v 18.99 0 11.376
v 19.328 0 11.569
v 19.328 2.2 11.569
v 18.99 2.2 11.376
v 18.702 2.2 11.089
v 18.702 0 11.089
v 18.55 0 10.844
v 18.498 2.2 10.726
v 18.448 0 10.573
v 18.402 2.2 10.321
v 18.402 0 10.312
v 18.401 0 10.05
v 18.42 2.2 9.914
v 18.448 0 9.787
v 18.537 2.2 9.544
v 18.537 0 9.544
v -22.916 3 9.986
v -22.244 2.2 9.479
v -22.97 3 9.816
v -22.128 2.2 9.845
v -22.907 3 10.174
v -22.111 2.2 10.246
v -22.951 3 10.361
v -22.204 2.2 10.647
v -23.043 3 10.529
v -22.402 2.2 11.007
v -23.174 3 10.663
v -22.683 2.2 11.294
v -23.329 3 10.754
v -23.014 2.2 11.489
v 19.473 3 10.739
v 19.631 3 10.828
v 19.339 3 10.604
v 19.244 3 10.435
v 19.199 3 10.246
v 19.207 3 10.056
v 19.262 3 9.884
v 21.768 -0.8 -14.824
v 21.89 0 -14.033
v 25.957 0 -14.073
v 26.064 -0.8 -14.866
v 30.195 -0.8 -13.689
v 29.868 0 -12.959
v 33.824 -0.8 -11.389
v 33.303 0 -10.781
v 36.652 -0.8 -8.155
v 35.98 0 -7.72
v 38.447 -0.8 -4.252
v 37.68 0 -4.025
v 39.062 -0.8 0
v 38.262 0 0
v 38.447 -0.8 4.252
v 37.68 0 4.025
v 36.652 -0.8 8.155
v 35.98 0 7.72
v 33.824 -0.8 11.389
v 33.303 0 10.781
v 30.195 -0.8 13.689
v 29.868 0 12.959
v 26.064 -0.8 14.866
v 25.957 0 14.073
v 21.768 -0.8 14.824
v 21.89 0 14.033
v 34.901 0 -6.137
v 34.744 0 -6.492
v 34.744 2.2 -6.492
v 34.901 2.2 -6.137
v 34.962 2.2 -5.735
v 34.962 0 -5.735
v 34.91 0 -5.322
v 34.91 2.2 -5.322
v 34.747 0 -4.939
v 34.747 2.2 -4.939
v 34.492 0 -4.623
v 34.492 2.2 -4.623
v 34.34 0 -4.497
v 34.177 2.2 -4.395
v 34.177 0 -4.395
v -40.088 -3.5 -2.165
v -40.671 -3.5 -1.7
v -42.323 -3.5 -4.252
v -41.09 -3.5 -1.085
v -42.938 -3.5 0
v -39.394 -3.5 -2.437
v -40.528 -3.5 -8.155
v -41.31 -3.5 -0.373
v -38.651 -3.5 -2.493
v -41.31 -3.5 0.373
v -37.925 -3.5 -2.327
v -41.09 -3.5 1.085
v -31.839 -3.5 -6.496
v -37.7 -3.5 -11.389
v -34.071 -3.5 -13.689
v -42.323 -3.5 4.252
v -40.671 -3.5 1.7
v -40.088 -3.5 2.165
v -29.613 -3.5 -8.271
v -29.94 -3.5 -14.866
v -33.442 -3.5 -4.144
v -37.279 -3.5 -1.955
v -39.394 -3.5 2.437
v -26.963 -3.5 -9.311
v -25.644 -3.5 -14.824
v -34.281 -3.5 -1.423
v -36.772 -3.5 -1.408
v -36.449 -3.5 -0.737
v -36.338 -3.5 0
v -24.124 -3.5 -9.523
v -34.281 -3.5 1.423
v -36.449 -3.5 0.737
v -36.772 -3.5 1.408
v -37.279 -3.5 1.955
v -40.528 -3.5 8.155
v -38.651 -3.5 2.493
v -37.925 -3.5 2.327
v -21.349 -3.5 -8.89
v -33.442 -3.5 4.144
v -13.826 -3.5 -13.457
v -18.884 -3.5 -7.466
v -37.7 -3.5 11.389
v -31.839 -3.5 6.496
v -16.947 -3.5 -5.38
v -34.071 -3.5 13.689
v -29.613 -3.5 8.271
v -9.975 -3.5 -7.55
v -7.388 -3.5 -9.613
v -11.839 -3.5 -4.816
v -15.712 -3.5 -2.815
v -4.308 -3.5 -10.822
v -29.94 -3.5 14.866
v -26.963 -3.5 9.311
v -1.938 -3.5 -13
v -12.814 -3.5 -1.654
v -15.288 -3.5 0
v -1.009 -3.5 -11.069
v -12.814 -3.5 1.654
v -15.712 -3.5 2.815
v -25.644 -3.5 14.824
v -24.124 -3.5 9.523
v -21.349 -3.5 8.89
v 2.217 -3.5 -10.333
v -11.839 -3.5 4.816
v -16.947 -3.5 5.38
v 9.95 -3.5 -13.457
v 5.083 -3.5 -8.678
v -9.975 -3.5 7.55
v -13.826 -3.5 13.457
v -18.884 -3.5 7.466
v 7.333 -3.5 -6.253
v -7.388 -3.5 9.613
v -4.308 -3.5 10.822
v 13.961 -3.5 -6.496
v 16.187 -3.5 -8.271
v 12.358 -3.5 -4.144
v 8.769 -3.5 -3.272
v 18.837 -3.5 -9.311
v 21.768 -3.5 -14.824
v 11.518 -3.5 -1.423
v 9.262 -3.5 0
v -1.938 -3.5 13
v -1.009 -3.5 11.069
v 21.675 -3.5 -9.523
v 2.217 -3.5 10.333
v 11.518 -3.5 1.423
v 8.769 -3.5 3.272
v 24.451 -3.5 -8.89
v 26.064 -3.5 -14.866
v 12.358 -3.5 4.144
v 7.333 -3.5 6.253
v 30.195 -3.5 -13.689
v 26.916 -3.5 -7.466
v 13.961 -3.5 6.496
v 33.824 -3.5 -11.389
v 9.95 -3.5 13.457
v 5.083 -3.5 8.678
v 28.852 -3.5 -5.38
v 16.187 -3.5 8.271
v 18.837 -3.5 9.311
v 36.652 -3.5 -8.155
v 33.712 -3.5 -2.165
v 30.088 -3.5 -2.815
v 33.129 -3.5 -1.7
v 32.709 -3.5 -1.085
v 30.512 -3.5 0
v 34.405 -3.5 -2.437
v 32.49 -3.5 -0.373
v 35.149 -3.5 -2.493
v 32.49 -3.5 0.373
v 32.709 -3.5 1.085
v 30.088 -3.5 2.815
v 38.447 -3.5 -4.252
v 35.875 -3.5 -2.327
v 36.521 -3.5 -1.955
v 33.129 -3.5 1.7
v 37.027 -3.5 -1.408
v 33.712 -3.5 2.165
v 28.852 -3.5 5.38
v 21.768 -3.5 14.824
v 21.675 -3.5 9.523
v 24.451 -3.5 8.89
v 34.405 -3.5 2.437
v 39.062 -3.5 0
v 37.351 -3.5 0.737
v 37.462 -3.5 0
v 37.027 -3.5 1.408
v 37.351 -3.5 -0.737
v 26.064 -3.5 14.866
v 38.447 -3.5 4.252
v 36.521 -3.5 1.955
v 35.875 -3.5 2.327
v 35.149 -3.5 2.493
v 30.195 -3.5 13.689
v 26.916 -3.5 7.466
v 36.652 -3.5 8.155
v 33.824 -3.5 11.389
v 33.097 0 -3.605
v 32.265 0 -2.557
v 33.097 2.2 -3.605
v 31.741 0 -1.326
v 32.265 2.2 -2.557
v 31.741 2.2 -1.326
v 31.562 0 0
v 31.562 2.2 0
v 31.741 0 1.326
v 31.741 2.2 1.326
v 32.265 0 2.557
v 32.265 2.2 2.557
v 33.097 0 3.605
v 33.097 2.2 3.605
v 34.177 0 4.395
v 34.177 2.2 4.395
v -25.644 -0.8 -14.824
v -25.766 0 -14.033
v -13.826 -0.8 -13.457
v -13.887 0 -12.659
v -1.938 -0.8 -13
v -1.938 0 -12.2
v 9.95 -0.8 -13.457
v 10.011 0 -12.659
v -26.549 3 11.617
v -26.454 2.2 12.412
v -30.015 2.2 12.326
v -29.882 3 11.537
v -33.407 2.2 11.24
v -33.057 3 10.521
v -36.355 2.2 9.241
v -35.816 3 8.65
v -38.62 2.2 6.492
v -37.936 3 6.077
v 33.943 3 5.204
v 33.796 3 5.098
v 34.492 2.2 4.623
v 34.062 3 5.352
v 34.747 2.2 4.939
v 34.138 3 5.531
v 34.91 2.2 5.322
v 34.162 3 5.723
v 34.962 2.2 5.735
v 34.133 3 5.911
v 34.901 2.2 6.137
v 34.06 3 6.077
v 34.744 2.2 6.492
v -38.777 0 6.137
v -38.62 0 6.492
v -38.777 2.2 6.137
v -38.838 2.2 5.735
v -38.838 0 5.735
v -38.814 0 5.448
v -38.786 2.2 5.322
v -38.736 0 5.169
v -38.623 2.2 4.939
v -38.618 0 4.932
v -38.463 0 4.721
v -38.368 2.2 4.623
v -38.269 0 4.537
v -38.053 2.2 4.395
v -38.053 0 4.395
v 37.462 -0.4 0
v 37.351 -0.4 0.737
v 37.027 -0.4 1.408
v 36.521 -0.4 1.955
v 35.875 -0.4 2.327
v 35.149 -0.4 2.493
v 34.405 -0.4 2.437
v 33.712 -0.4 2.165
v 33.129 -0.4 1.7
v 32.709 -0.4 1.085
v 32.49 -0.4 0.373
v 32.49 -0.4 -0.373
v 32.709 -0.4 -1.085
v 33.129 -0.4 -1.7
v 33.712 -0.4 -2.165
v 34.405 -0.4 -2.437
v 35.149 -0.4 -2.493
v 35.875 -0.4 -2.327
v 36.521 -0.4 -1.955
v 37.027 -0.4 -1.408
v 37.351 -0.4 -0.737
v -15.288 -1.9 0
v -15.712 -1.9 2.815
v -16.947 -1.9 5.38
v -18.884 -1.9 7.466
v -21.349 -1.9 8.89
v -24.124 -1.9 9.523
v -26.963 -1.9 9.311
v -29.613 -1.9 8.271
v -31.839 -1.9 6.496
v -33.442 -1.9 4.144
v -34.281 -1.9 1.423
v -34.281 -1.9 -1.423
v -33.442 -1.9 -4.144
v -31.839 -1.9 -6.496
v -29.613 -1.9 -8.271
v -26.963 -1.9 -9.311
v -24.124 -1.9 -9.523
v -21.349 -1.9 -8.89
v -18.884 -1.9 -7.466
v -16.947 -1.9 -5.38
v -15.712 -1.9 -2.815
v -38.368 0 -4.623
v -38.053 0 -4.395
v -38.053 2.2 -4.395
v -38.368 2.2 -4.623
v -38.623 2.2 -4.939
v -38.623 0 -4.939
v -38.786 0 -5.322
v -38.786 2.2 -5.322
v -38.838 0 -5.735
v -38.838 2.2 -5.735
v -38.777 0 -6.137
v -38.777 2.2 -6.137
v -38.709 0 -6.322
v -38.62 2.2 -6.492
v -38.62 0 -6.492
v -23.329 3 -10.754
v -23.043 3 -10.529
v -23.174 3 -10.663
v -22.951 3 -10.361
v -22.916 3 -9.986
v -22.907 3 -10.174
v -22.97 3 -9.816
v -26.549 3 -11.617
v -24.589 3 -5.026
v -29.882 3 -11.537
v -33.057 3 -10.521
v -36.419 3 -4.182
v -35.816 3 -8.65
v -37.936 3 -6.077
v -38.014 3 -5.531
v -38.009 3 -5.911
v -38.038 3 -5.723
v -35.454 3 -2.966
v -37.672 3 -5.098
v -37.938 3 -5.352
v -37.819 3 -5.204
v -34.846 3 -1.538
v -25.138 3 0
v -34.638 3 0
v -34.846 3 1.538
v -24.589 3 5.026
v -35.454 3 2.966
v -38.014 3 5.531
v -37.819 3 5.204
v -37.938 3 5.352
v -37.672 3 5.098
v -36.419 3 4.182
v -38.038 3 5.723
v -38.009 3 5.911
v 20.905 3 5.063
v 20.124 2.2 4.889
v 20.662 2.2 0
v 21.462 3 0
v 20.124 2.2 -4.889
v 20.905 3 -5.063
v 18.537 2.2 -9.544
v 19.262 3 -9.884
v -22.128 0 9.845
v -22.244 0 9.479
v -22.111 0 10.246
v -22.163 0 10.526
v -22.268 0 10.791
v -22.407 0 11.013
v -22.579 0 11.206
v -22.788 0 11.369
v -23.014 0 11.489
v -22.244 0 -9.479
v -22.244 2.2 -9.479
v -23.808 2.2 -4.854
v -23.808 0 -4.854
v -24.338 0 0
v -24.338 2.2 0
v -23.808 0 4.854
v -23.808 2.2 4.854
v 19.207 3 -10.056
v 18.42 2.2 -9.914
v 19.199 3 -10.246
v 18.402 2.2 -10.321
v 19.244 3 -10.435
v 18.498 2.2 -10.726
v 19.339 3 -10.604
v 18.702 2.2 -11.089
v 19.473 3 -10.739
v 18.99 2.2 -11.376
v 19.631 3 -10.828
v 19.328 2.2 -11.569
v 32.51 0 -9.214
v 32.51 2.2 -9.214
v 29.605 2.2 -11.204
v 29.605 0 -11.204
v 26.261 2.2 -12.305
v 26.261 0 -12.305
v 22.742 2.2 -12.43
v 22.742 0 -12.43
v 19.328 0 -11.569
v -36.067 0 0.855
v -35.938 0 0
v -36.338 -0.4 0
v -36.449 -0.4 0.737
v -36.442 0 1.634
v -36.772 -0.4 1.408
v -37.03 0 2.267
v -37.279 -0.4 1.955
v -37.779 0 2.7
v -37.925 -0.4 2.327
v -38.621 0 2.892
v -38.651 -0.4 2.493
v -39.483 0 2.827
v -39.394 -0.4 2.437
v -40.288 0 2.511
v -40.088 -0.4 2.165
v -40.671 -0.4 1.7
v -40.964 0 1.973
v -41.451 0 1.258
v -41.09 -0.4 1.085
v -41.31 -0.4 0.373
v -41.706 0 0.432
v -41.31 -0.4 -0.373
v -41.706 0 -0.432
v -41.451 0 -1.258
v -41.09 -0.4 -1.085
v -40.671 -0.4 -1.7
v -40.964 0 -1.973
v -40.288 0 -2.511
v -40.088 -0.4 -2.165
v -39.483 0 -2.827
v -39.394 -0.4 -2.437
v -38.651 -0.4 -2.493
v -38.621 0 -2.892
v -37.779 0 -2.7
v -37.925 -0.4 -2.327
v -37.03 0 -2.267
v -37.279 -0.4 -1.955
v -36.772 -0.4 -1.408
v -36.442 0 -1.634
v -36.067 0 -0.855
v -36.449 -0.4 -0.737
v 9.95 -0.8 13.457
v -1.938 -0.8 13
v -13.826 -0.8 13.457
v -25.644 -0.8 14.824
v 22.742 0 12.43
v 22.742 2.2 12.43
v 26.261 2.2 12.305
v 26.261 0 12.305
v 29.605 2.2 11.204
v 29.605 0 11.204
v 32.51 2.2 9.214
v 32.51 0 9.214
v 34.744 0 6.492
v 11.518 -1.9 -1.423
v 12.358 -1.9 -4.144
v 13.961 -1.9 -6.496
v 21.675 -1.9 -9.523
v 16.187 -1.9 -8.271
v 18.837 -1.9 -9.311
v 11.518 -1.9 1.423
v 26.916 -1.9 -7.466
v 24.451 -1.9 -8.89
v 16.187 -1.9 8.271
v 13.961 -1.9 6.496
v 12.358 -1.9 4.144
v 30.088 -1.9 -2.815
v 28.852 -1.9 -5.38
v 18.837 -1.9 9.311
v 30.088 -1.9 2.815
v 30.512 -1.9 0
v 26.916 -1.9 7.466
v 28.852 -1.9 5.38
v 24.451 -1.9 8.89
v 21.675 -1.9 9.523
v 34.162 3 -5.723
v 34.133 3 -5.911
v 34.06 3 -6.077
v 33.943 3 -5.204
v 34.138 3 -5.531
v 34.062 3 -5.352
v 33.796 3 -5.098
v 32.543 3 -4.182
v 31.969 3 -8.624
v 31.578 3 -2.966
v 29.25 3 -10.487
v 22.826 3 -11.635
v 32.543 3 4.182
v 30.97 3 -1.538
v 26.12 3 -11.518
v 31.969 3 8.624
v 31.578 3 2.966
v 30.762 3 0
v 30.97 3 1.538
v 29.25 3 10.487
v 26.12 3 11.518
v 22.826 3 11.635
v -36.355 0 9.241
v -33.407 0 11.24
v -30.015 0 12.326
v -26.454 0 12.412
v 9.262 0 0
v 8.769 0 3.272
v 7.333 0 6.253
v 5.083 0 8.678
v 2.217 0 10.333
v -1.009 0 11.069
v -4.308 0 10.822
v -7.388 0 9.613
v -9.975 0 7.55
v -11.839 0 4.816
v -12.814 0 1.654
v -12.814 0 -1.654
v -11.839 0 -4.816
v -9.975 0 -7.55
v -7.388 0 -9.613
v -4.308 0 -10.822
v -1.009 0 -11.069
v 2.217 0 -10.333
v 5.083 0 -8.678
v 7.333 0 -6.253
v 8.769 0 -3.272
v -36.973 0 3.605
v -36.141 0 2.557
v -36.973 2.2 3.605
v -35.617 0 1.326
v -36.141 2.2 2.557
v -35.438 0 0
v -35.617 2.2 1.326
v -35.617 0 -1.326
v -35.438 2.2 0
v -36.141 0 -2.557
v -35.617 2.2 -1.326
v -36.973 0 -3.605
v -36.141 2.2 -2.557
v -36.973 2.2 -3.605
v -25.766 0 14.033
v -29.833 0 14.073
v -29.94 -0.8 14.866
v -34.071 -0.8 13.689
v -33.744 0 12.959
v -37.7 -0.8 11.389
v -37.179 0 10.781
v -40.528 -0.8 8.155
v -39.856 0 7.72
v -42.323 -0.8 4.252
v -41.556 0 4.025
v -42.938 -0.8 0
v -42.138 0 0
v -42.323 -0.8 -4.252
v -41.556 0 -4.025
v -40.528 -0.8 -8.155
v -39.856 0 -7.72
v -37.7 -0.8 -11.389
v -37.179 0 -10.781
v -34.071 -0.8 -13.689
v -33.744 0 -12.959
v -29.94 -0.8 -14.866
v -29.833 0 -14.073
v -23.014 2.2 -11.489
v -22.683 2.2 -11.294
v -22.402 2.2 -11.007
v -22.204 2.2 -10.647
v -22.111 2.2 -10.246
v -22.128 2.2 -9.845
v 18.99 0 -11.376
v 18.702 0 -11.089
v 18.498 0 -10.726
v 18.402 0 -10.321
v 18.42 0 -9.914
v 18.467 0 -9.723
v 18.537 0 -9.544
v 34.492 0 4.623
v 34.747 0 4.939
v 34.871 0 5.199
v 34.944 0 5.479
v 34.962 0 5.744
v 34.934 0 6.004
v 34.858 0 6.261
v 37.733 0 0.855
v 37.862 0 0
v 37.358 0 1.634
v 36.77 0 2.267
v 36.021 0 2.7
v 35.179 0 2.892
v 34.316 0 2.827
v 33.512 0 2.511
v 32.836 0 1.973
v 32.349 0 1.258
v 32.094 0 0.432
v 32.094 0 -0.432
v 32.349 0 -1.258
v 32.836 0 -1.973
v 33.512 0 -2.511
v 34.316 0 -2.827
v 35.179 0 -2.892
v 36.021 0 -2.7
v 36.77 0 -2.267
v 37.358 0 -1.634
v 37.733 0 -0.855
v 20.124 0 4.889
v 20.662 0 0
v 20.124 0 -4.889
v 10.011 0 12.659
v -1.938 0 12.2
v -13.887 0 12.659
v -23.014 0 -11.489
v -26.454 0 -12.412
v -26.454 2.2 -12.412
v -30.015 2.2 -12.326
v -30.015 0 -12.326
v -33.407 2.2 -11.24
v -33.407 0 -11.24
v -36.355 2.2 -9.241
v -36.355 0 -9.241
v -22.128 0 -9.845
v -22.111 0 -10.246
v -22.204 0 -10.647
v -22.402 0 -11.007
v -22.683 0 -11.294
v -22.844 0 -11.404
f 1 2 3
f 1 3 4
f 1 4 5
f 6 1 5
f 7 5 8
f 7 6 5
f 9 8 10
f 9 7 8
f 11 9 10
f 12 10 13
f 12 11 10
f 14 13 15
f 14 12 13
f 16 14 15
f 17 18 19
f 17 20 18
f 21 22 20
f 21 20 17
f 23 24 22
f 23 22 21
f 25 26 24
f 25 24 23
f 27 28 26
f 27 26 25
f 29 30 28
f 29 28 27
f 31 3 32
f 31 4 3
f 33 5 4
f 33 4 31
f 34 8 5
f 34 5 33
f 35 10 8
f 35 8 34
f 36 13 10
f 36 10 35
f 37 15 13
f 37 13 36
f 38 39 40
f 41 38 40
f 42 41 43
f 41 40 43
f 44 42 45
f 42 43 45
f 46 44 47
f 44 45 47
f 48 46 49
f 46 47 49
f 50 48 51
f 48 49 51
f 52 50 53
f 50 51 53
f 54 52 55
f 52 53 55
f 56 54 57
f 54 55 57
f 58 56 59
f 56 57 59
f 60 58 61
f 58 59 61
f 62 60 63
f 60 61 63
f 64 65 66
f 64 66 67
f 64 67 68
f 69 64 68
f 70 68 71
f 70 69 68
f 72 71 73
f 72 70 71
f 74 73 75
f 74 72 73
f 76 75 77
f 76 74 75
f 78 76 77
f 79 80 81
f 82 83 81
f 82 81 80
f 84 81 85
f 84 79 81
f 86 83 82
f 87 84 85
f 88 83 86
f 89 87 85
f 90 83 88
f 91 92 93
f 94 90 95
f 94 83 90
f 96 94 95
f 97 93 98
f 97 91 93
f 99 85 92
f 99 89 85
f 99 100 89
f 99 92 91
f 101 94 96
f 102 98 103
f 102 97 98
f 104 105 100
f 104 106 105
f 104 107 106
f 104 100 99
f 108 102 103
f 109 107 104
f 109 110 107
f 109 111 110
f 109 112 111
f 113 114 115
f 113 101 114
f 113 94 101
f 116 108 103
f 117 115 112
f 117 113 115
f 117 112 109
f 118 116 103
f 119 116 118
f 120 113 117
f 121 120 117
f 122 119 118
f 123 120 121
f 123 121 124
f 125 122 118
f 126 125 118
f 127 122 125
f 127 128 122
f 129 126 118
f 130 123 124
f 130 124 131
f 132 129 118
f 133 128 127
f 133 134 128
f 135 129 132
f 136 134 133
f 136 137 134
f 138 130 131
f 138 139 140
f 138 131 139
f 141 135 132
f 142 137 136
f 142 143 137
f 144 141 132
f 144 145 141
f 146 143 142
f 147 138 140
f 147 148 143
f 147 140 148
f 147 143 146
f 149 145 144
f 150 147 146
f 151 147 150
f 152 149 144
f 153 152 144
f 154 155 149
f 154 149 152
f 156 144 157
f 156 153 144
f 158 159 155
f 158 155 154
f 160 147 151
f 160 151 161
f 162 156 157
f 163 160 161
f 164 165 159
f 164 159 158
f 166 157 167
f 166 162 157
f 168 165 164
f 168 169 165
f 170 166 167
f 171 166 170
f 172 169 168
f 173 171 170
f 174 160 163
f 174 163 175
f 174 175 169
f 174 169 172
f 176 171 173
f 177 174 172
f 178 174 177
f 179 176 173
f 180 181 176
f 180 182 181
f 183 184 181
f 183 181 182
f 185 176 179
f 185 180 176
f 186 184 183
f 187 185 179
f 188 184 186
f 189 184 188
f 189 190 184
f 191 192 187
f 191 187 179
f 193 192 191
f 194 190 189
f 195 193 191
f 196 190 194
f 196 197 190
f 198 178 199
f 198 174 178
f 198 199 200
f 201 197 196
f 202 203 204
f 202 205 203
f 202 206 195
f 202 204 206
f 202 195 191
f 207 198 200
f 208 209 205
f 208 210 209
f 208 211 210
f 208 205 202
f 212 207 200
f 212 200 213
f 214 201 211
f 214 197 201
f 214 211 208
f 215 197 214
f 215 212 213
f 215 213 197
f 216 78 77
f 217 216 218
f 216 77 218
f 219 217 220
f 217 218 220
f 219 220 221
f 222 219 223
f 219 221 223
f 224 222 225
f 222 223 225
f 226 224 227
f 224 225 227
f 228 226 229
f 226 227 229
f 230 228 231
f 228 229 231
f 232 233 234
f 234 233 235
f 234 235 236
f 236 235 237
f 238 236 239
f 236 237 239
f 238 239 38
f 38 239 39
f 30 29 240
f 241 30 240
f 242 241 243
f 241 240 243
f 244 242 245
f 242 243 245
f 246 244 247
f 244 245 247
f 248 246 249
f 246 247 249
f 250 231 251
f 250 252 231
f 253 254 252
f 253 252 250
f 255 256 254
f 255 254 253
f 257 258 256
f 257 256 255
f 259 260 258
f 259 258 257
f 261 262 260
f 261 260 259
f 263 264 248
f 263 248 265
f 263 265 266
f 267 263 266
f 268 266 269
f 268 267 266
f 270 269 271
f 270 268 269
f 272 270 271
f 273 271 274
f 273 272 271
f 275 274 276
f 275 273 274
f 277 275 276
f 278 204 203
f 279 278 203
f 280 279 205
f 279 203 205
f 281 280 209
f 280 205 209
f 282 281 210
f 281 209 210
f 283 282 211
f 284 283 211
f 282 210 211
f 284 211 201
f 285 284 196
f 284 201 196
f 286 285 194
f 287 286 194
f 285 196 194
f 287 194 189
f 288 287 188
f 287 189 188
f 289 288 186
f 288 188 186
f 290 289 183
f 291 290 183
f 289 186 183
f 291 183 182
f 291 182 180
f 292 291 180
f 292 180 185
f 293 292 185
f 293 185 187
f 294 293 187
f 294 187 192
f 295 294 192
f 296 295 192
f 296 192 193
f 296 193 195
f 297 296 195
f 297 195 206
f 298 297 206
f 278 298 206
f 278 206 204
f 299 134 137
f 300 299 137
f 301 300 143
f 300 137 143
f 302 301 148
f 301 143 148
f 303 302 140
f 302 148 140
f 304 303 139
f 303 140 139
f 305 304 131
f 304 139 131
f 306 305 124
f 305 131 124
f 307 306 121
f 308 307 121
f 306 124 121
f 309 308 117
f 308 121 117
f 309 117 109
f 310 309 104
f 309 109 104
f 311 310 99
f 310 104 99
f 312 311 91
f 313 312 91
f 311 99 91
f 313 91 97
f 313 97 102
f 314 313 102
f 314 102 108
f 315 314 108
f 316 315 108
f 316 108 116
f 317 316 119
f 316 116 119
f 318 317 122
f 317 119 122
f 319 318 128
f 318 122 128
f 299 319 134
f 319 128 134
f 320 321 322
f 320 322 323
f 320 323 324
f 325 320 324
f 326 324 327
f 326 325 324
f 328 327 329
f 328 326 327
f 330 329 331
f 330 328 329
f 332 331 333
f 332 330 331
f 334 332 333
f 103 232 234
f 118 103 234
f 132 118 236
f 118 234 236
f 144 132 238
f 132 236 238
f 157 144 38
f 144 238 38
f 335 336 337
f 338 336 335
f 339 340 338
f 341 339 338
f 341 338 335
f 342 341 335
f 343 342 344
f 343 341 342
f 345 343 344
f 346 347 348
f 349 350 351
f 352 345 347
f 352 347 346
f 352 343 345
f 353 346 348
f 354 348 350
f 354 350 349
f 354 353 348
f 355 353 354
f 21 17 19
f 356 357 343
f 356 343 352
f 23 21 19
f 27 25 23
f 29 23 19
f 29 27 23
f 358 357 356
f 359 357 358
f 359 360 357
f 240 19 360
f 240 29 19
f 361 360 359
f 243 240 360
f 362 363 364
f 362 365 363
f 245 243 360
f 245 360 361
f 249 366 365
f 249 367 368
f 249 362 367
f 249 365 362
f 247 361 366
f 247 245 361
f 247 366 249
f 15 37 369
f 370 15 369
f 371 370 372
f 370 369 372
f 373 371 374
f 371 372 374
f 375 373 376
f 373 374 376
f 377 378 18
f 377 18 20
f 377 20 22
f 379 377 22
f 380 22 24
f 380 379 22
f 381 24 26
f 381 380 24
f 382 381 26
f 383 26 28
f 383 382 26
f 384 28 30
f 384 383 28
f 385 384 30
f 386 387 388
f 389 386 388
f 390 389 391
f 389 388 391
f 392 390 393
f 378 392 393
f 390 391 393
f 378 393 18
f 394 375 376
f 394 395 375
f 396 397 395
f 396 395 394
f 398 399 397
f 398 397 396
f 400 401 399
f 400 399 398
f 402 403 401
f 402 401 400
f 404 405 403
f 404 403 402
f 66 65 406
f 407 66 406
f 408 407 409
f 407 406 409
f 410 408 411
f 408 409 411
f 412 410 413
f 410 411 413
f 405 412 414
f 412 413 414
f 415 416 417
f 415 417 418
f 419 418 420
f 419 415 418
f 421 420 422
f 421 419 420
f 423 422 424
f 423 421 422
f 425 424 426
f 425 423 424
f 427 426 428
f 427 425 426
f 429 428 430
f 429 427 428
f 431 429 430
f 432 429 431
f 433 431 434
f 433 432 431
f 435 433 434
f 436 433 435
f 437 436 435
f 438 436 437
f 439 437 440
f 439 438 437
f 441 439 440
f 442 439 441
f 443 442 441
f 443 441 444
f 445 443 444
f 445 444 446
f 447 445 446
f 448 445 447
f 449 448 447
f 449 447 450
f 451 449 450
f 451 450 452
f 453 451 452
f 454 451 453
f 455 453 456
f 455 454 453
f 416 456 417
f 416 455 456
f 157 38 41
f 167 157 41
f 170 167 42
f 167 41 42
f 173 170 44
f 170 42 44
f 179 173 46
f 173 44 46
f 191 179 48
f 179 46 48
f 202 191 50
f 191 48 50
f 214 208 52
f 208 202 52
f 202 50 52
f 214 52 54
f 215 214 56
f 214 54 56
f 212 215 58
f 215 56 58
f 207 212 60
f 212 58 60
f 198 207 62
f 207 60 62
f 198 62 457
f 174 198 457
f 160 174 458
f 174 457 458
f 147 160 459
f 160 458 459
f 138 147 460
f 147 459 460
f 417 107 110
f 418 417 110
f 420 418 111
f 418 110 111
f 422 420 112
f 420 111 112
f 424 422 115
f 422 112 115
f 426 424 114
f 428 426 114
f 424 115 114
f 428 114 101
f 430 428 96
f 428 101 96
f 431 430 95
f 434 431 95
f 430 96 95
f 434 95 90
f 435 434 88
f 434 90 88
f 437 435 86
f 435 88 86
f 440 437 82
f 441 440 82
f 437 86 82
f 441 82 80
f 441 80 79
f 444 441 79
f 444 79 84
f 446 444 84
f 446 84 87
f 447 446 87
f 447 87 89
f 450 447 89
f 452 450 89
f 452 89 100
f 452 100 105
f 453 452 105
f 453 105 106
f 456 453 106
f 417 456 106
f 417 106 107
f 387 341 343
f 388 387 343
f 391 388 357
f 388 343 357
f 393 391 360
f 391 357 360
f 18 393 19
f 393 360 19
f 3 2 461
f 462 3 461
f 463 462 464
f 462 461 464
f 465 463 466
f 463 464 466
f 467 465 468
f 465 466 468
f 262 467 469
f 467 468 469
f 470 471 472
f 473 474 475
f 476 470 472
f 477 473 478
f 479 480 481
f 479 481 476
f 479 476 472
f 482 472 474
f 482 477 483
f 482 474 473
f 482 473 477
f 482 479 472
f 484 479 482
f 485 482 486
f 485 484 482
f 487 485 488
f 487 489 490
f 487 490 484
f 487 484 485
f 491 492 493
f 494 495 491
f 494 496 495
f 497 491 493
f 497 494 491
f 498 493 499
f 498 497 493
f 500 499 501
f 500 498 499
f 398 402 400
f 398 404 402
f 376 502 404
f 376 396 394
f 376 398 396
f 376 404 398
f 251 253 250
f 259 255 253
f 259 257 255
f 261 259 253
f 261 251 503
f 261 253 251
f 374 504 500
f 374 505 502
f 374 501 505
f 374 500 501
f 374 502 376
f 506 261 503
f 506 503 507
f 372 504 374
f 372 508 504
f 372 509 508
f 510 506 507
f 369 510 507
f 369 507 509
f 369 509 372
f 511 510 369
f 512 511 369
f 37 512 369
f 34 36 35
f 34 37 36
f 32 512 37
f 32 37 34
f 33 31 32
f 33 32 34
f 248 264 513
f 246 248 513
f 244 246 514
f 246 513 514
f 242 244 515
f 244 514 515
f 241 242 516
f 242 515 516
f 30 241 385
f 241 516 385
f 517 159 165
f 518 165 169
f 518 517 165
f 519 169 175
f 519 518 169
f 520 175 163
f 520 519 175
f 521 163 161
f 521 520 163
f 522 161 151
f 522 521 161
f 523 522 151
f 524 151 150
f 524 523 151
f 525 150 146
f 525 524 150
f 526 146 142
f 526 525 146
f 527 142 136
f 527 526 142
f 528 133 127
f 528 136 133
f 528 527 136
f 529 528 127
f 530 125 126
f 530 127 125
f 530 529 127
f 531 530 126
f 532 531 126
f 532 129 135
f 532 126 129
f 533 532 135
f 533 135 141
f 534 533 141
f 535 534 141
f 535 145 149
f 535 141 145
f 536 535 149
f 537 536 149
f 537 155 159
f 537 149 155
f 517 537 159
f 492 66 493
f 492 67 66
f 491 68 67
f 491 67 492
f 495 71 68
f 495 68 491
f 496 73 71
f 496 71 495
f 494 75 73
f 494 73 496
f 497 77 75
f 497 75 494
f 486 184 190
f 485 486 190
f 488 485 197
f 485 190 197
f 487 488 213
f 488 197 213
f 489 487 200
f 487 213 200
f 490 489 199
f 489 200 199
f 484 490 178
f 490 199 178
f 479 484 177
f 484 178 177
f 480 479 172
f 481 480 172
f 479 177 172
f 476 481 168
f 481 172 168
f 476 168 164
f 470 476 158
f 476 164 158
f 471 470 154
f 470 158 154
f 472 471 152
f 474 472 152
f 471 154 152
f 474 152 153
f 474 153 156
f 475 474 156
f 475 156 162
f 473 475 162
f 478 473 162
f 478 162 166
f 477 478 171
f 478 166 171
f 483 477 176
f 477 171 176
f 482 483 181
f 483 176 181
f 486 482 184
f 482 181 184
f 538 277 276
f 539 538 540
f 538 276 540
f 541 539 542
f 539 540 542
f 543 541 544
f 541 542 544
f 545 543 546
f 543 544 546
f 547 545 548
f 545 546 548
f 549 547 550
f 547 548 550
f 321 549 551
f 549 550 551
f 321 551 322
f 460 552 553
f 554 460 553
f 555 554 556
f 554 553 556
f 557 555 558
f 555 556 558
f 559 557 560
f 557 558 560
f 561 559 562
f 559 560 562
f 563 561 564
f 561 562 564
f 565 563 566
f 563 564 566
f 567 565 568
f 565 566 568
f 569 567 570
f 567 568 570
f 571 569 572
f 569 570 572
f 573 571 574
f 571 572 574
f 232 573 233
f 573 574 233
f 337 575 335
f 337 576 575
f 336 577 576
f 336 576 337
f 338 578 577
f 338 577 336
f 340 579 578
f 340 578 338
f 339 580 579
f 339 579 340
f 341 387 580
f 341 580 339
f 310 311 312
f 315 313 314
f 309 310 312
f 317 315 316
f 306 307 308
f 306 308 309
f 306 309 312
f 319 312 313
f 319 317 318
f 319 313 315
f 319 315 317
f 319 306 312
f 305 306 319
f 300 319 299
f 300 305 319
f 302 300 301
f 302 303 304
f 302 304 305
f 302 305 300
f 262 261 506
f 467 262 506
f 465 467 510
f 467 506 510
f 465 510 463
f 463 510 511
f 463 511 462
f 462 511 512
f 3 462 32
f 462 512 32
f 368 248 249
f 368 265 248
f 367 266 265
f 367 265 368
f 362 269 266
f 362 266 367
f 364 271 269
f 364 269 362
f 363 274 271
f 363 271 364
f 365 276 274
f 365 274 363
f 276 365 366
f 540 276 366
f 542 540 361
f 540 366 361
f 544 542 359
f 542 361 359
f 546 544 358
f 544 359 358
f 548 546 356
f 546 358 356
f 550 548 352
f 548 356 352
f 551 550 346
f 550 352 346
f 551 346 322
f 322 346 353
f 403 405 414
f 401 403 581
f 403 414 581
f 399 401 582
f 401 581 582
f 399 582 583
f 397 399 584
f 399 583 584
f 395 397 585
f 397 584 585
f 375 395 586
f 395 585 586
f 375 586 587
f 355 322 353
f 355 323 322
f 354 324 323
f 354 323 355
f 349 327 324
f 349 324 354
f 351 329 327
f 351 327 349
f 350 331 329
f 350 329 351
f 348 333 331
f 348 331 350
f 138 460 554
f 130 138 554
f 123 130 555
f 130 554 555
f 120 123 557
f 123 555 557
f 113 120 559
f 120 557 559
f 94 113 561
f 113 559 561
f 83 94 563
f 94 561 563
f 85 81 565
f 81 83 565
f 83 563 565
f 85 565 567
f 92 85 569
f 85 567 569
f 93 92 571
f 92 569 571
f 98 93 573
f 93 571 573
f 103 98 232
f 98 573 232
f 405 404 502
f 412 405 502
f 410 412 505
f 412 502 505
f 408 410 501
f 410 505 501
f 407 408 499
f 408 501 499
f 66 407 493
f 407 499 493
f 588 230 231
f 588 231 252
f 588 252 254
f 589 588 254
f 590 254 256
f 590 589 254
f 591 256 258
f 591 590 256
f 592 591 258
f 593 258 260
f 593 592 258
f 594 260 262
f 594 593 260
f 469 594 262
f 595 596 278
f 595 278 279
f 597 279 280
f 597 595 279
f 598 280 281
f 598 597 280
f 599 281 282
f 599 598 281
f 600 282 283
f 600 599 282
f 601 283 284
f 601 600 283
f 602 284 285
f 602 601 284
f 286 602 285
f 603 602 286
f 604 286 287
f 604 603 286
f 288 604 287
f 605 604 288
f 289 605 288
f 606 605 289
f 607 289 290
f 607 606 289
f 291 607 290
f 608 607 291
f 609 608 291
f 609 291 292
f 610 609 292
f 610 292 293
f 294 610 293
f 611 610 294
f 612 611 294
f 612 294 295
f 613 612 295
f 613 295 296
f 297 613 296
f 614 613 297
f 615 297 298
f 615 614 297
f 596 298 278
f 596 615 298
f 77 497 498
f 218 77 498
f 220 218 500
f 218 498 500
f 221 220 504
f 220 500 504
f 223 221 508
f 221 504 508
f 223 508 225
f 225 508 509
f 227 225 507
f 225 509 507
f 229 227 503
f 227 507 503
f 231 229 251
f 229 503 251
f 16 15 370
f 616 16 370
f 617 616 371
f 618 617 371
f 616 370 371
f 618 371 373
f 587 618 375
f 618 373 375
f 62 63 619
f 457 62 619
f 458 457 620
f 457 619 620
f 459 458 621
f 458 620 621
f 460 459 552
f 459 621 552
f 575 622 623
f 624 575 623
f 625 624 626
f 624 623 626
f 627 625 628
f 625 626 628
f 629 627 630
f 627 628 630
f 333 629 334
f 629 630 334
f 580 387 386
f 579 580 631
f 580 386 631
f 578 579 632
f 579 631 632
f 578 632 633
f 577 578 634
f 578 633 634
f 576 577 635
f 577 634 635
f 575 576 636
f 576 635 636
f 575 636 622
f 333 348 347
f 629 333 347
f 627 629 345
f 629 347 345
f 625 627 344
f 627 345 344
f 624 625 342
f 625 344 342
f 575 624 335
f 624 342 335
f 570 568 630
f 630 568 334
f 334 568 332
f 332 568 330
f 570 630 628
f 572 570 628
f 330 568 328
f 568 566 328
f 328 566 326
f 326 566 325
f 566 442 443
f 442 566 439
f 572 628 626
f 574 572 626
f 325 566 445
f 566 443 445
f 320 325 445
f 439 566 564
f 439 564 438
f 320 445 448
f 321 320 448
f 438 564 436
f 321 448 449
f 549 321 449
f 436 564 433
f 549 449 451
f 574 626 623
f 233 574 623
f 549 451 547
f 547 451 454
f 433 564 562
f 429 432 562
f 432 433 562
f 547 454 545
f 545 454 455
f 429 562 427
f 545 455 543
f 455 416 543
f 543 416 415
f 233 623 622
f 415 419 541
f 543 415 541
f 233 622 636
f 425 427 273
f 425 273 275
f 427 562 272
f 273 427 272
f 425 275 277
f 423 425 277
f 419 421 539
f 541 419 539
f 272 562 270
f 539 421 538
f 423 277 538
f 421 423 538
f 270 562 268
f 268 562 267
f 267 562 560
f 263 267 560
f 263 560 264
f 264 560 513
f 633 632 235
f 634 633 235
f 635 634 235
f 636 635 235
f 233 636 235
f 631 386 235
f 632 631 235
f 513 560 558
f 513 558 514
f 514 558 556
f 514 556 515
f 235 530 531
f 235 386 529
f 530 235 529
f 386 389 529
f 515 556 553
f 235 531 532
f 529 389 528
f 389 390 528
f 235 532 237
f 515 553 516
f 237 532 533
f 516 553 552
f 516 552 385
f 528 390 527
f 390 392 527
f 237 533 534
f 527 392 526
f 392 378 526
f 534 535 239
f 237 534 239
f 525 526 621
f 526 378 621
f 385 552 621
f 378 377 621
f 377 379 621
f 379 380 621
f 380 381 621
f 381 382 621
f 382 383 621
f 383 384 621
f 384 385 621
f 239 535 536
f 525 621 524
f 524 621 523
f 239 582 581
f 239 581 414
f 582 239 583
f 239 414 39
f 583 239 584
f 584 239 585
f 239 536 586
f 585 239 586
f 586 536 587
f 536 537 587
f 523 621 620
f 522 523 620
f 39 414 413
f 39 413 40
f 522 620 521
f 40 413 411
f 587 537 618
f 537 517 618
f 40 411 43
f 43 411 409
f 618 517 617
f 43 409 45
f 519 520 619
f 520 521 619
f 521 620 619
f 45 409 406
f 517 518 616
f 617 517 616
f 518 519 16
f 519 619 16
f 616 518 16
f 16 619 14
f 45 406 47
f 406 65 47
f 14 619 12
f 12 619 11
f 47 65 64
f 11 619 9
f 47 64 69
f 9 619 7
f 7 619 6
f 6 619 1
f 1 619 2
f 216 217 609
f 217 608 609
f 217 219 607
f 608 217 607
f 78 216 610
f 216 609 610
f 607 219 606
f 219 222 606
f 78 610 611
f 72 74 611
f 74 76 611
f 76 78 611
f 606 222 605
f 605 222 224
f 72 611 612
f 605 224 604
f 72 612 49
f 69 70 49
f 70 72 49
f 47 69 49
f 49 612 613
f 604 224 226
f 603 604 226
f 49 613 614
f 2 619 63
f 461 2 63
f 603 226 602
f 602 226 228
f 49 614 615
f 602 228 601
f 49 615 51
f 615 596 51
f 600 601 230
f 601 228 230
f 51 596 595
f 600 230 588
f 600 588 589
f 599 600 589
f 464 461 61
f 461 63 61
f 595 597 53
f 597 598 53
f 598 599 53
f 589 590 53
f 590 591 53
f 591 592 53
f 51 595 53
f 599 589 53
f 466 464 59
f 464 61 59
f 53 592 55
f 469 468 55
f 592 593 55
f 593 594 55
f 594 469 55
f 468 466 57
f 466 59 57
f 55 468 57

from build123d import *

# Parameters (mm, degrees)
F0_R      = 11.1
F1_DEPTH  = 7
F2_SIZE   = 0.8
F3_R      = 12.5
F4_DEPTH  = 3
F5_R      = 12.5
F6_DEPTH  = 3
F8_R      = 22.5
F9_DEPTH  = 3
F10_R     = 22.5
F11_DEPTH = 3
F12_R     = 5
F13_DEPTH = 3
F14_R     = 5
F15_DEPTH = 3
F16_R     = 5
F17_DEPTH = 3
F18_R     = 5
F19_DEPTH = 3
F20_R     = 1.5
F21_R     = 2.5
F22_DEPTH = 25
F23_R     = 2.5
F24_DEPTH = 25
F25_SIZE  = 0.4
F26_SIZE  = 0.8
F27_W     = 103.2572649419
F27_H     = 49.3412911892
F28_DEPTH = 6.5
F29_R     = 9.55
F30_DEPTH = 1.6


with BuildPart() as f1:
    # F0 (on Front) → F1 (new body)
    with BuildSketch(Plane.XZ):
        with BuildLine():
            ThreePointArc((21.7678643686, 14.8235294118), (-1.9380179843, 13), (-25.6439003372, 14.8235294118))
            ThreePointArc((-25.6439003372, 14.8235294118), (-42.9380179843, 0), (-25.6439003372, -14.8235294118))
            ThreePointArc((-25.6439003372, -14.8235294118), (-1.9380179843, -13), (21.7678643686, -14.8235294118))
            ThreePointArc((21.7678643686, -14.8235294118), (39.0619820157, 0), (21.7678643686, 14.8235294118))
        make_face()
        with Locations((-1.8380179843, 0)):
            Circle(F0_R, mode=Mode.SUBTRACT)
    extrude(amount=F1_DEPTH)

    # F2
    f2_edges = [f1.edges().sort_by_distance(p)[0] for p in [
        (-42.938018, -7, 0),
        (-1.938018, -7, -13),
        (-1.938018, 0, -13),
    ]]
    chamfer(f2_edges, length=F2_SIZE)

    # F3 (on face) → F4 (join)
    with BuildSketch(Plane.XZ.offset(7)):
        with Locations((-27.9380179843, 0)):
            Circle(F3_R)
        with Locations((24.0619820157, 0)):
            Circle(F3_R)
    extrude(amount=F4_DEPTH)

    # F5 (on face) → F6 (join)
    with BuildSketch(Plane(origin=(0, 0, 0), x_dir=(-1, 0, 0), z_dir=(0, 1, 0))):
        with Locations((-24.0619820157, 0)):
            Circle(F5_R)
        with Locations((27.9380179843, 0)):
            Circle(F5_R)
    extrude(amount=F6_DEPTH)

    # F8 (on face) → F9 (cut)
    with BuildSketch(Plane.XZ.offset(10)):
        with Locations((-1.8380179843, 0)):
            Circle(F8_R)
    extrude(amount=-F9_DEPTH, mode=Mode.SUBTRACT)

    # F10 (on face) → F11 (cut)
    with BuildSketch(Plane(origin=(0, 3, 0), x_dir=(-1, 0, 0), z_dir=(0, 1, 0))):
        with Locations((1.8380179843, 0)):
            Circle(F10_R)
    extrude(amount=-F11_DEPTH, mode=Mode.SUBTRACT)

    # F12 (on face) → F13 (cut)
    with BuildSketch(Plane(origin=(0, 3, 0), x_dir=(-1, 0, 0), z_dir=(0, 1, 0))):
        with Locations((-36.5619820157, 0)):
            Circle(F12_R)
    extrude(amount=-F13_DEPTH, mode=Mode.SUBTRACT)

    # F14 (on face) → F15 (cut)
    with BuildSketch(Plane(origin=(0, 3, 0), x_dir=(-1, 0, 0), z_dir=(0, 1, 0))):
        with Locations((40.4380179843, 0)):
            Circle(F14_R)
    extrude(amount=-F15_DEPTH, mode=Mode.SUBTRACT)

    # F16 (on face) → F17 (cut)
    with BuildSketch(Plane.XZ.offset(10)):
        with Locations((-40.4380179843, 0)):
            Circle(F16_R)
    extrude(amount=-F17_DEPTH, mode=Mode.SUBTRACT)

    # F18 (on face) → F19 (cut)
    with BuildSketch(Plane.XZ.offset(10)):
        with Locations((36.5617908537, 0)):
            Circle(F18_R)
    extrude(amount=-F19_DEPTH, mode=Mode.SUBTRACT)

    # F20
    f20_edges = [f1.edges().sort_by_distance(p)[0] for p in [
        (-39.438018, -8.5, 4.898979),
        (-39.438018, -8.5, -4.898979),
        (-21.592999, -8.5, -10.769899),
        (-21.592999, -8.5, 10.769899),
        (17.868739, -8.5, 10.857888),
        (17.868739, -8.5, -10.857888),
        (35.561967, -8.5, -4.899015),
        (35.561967, -8.5, 4.899015),
        (-21.592999, 1.5, -10.769899),
        (-21.592999, 1.5, 10.769899),
        (-39.438018, 1.5, 4.898979),
        (-39.438018, 1.5, -4.898979),
        (17.868739, 1.5, -10.857888),
        (17.868739, 1.5, 10.857888),
        (35.561982, 1.5, -4.898979),
        (35.561982, 1.5, 4.898979),
    ]]
    fillet(f20_edges, radius=F20_R)

    # F21 (on face) → F22 (cut)
    with BuildSketch(Plane.XZ.offset(7)):
        with Locations((-38.8380179843, 0)):
            Circle(F21_R)
    extrude(amount=-F22_DEPTH, mode=Mode.SUBTRACT)

    # F23 (on face) → F24 (cut)
    with BuildSketch(Plane.XZ.offset(7)):
        with Locations((34.9617908537, 0)):
            Circle(F23_R)
    extrude(amount=-F24_DEPTH, mode=Mode.SUBTRACT)

    # F25
    f25_edges = [f1.edges().sort_by_distance(p)[0] for p in [
        (-41.338018, -7, 0),
        (32.461791, -7, 0),
        (32.461791, 0, 0),
        (-41.338018, 0, 0),
    ]]
    chamfer(f25_edges, length=F25_SIZE)

    # F26
    f26_edges = [f1.edges().sort_by_distance(p)[0] for p in [
        (27.97166, -10, 11.872844),
        (18.498441, -10, 10.725925),
        (34.910055, -10, 5.322137),
        (20.661982, -10, 0),
        (31.561791, -10, 0),
        (18.498441, -10, -10.725925),
        (34.910055, -10, -5.322137),
        (27.97166, -10, -11.872844),
        (-24.338018, -10, 0),
        (-22.203581, -10, 10.646558),
        (-22.203581, -10, -10.646558),
        (-31.749718, -10, 11.904661),
        (-31.749718, -10, -11.904661),
        (-38.786142, -10, 5.322071),
        (-38.786142, -10, -5.322071),
        (-35.438018, -10, 0),
        (-24.338018, 3, 0),
        (-22.203581, 3, -10.646558),
        (-22.203581, 3, 10.646558),
        (-31.749718, 3, -11.904661),
        (-31.749718, 3, 11.904661),
        (-38.786142, 3, -5.322071),
        (-38.786142, 3, 5.322071),
        (-35.438018, 3, 0),
        (20.661982, 3, 0),
        (18.498441, 3, 10.725925),
        (18.498441, 3, -10.725925),
        (27.971709, 3, 11.872828),
        (27.971709, 3, -11.872828),
        (34.910106, 3, 5.322071),
        (34.910106, 3, -5.322071),
        (31.561982, 3, 0),
    ]]
    chamfer(f26_edges, length=F26_SIZE)

    # F27 (on face) → F28 (cut)
    with BuildSketch(Plane.XZ.offset(10)):
        with Locations((-3.2676365227, 0)):
            Rectangle(F27_W, F27_H)
    extrude(amount=-F28_DEPTH, mode=Mode.SUBTRACT)

    # F29 (on face) → F30 (cut)
    with BuildSketch(Plane.XZ.offset(3.5)):
        with Locations((-24.8380179843, 0)):
            Circle(F29_R)
        with Locations((20.9617908537, 0)):
            Circle(F29_R)
    extrude(amount=-F30_DEPTH, mode=Mode.SUBTRACT)


solid = f1.part
